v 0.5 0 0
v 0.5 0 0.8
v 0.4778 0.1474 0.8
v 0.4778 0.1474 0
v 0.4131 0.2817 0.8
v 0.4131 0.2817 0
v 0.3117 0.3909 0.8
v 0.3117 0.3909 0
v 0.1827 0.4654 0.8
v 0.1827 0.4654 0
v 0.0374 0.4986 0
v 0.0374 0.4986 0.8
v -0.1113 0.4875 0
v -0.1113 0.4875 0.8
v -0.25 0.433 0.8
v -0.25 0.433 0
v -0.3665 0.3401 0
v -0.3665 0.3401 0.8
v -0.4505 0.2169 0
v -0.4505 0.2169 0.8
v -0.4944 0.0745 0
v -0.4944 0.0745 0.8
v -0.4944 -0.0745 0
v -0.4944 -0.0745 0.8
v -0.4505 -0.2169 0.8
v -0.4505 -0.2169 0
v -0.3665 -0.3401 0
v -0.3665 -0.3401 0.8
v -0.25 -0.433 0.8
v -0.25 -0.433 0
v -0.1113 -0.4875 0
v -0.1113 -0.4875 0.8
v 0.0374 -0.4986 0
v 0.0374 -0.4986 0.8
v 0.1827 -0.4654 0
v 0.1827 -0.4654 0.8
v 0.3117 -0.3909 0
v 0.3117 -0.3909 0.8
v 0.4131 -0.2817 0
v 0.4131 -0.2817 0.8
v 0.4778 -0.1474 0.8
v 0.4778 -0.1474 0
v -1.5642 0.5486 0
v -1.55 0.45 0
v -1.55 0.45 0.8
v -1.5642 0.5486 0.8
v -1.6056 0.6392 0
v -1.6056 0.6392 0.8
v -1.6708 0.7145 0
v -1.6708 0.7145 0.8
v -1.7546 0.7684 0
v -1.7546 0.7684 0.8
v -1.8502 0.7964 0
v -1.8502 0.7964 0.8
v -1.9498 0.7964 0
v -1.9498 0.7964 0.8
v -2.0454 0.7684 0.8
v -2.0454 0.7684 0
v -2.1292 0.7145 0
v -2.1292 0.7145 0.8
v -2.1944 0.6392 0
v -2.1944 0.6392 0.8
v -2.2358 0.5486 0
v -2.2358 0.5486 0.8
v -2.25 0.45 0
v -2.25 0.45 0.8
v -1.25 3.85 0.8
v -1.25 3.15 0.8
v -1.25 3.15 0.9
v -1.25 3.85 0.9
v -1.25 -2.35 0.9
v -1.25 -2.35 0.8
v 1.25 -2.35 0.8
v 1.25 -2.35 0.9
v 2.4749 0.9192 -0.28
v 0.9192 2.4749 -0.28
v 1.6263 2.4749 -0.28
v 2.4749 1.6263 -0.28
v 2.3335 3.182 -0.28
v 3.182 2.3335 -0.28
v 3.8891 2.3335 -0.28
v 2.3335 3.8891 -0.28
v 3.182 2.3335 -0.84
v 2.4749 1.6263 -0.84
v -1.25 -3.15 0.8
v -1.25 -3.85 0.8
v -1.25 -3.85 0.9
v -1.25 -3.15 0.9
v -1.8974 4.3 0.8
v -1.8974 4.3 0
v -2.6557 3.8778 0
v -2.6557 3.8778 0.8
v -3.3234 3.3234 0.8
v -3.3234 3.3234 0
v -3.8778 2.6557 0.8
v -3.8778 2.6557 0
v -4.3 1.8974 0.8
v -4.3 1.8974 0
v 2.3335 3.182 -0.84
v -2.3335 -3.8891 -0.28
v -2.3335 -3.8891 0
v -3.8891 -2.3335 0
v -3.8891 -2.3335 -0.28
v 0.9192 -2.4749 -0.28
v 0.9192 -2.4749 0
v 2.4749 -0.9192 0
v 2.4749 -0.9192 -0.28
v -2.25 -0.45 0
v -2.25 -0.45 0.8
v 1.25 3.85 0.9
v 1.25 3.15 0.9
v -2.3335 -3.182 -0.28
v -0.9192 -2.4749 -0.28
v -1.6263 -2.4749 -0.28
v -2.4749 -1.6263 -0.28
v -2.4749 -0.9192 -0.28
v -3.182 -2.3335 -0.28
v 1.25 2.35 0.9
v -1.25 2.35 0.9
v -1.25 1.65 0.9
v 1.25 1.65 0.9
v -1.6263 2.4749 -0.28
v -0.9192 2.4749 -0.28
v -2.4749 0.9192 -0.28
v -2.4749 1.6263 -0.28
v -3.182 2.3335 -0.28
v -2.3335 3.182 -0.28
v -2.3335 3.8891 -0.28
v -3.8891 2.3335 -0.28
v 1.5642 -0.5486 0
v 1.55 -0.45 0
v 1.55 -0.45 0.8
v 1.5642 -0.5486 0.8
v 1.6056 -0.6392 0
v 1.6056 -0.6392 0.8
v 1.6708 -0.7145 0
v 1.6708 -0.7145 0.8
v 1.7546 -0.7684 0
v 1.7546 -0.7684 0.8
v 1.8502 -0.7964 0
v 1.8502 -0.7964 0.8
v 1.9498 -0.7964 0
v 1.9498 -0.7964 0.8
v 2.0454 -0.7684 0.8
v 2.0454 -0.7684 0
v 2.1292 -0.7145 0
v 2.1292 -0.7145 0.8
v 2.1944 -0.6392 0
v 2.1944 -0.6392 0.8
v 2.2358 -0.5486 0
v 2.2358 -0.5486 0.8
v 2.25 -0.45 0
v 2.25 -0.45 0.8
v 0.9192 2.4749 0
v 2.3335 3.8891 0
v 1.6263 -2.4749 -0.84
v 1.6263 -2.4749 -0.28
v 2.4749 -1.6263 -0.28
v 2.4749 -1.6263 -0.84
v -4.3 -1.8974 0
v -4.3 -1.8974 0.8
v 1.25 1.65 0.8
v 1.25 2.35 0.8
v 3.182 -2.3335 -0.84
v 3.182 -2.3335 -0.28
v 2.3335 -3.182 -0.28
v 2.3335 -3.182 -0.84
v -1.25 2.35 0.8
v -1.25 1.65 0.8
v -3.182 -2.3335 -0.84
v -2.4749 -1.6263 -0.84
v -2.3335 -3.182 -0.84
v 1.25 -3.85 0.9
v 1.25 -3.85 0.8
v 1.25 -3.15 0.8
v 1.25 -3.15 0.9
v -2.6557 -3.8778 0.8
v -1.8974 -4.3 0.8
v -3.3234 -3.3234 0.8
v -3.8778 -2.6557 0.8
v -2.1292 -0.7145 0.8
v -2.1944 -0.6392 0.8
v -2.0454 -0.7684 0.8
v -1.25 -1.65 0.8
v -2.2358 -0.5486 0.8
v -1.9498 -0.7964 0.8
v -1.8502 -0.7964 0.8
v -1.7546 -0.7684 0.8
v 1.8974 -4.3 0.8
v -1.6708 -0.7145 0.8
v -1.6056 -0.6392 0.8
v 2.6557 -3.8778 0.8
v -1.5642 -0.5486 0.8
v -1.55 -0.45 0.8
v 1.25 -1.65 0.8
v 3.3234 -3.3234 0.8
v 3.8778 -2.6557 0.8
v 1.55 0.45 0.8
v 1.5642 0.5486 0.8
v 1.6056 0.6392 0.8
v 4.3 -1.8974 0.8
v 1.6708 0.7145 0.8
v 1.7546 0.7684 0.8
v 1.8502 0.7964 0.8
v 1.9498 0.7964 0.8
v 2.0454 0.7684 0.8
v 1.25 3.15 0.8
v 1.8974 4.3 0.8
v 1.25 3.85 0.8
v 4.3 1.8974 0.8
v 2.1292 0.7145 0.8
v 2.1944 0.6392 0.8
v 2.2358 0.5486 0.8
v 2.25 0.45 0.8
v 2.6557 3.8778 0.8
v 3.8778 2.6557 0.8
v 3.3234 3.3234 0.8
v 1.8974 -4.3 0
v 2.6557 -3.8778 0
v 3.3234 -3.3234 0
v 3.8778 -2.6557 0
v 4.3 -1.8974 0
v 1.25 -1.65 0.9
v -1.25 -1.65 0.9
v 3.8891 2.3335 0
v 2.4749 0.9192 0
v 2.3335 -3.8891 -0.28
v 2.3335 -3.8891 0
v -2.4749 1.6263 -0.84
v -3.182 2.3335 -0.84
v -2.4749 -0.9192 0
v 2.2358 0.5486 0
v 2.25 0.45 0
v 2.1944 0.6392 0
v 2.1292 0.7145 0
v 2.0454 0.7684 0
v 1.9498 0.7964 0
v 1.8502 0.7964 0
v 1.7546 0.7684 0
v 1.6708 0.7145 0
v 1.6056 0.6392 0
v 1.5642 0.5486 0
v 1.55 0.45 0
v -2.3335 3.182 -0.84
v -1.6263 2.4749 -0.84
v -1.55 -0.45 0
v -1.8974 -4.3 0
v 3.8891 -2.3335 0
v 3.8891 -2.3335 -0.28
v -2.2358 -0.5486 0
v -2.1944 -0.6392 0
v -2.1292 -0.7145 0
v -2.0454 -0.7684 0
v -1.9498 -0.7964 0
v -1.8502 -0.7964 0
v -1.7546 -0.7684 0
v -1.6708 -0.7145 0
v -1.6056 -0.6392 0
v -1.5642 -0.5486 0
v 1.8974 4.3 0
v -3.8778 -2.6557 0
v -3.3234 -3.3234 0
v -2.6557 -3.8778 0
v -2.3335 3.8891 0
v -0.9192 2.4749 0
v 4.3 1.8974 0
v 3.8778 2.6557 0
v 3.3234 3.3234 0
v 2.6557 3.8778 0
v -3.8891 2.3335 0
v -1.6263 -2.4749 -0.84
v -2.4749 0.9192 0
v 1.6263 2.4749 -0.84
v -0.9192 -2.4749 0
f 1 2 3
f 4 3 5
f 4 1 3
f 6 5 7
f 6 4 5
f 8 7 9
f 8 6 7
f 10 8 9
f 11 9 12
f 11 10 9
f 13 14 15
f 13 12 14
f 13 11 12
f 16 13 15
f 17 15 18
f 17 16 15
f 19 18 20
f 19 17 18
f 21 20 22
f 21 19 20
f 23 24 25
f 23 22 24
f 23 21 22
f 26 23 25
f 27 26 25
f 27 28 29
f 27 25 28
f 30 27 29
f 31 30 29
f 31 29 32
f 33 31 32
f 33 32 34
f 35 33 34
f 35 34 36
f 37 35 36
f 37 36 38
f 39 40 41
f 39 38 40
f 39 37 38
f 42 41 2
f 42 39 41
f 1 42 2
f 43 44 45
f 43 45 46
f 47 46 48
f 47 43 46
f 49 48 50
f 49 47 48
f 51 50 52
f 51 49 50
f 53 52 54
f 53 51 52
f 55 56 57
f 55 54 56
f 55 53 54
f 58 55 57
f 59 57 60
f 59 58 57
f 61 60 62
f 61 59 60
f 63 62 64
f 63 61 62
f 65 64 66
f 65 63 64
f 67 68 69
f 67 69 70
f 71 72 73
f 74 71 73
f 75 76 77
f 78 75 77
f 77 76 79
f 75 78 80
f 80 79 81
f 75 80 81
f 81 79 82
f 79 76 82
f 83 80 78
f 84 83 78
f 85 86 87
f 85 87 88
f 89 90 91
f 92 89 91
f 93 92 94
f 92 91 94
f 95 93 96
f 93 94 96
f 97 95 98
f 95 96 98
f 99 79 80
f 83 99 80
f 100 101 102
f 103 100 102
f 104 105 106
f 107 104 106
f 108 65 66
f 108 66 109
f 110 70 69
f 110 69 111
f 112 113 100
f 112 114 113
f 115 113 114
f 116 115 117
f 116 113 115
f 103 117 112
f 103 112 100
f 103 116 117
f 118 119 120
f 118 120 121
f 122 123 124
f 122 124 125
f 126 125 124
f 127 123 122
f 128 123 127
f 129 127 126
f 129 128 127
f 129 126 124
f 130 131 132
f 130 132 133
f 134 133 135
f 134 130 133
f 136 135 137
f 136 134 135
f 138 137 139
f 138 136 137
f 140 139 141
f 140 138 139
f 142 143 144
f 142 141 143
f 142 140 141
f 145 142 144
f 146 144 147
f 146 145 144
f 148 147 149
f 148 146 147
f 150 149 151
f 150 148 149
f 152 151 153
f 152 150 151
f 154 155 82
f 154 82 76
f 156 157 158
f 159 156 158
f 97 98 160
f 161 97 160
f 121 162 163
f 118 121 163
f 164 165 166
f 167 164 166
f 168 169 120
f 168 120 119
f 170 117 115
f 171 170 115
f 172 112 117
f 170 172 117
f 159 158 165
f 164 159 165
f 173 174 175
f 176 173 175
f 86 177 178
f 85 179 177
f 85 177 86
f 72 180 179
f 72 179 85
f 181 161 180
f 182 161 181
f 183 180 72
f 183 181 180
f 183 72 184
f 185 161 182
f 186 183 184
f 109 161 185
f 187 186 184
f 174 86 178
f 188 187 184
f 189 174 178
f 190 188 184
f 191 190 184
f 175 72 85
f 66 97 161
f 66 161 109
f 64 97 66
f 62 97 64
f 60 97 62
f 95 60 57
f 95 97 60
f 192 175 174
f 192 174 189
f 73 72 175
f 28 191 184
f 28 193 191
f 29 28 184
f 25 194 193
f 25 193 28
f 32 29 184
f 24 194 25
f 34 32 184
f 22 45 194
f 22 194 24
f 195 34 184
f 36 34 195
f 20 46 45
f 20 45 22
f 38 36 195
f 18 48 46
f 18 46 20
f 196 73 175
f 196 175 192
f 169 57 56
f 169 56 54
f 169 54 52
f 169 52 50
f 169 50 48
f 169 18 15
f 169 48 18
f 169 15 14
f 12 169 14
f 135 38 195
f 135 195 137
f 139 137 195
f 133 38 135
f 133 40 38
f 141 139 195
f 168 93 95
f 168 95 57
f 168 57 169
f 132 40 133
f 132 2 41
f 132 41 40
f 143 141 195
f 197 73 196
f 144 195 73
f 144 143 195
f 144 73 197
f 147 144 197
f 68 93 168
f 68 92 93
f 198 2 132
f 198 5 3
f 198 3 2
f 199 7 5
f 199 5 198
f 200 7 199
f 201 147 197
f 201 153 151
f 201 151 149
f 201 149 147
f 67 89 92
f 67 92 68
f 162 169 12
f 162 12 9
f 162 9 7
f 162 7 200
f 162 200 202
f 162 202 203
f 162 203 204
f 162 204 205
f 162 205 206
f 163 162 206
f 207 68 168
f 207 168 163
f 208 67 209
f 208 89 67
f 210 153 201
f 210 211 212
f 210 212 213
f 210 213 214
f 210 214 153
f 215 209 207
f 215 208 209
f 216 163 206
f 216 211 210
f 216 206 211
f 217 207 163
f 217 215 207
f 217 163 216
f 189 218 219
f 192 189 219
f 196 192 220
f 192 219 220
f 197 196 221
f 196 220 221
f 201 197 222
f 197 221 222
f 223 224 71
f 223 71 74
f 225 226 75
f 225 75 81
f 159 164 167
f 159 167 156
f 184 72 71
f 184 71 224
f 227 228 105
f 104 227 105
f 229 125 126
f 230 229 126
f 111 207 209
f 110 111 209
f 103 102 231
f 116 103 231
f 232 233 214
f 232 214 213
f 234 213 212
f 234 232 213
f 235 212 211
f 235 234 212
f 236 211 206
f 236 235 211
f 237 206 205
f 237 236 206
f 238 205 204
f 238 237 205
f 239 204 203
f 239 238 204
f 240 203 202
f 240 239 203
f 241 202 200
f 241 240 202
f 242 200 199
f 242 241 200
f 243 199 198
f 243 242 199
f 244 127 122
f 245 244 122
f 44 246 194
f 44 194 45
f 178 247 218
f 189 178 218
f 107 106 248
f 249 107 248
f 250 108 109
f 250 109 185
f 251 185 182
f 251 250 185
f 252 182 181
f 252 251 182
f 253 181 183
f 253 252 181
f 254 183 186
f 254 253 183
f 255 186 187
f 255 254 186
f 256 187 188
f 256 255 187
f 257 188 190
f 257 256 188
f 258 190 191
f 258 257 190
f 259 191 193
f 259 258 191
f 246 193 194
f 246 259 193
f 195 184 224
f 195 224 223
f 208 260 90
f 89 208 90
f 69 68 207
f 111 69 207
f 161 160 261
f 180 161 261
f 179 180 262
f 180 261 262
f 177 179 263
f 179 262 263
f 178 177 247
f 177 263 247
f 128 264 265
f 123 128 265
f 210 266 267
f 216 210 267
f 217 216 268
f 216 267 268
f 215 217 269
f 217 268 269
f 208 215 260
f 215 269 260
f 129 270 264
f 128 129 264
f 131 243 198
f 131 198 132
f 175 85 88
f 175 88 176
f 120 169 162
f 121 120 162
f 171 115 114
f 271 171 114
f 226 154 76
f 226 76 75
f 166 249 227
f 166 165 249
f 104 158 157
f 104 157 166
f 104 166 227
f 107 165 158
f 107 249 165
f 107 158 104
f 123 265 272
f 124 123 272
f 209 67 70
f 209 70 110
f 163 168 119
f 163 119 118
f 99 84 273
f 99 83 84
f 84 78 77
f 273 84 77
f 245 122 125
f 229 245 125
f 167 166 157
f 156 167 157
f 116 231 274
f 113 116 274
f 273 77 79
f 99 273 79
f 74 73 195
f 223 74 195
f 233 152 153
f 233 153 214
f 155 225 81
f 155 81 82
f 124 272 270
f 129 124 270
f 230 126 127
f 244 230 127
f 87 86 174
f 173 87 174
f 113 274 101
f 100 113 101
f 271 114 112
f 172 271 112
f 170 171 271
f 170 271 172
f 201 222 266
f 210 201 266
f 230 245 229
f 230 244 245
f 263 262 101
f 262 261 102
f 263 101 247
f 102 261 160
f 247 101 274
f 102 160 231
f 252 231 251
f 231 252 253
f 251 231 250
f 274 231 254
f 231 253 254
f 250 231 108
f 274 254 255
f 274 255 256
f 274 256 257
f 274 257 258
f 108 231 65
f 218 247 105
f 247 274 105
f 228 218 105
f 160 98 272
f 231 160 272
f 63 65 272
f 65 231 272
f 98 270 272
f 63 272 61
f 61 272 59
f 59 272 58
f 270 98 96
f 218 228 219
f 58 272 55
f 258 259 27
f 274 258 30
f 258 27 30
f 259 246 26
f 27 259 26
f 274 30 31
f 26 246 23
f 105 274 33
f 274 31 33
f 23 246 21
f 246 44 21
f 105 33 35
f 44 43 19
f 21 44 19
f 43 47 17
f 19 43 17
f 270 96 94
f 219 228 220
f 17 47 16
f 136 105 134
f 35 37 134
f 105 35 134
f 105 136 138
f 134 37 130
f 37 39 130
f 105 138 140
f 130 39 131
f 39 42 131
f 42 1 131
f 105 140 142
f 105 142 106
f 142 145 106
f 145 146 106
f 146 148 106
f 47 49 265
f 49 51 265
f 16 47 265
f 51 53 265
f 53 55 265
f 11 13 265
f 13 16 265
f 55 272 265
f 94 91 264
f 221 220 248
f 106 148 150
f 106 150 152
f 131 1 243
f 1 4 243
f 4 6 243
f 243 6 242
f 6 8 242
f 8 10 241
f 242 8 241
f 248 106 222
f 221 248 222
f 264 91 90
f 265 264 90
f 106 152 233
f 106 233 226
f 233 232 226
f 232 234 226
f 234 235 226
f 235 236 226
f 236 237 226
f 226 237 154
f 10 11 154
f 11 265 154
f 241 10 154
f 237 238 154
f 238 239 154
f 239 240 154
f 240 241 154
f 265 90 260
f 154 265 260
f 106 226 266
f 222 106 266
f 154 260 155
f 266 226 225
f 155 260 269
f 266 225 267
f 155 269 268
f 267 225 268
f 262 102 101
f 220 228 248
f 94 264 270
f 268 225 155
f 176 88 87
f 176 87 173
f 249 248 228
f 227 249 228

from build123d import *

# Parameters (mm, degrees)
EXTRUDE_5_DEPTH     = 0.8
EXTRUDE_6_DEPTH     = 0.28
EXTRUDE_8_DEPTH     = 0.84
SKETCH_1_9_R        = 0.5
CUT_EXTRUDE_1_DEPTH = 1.8
SKETCH_2_W          = 2.5
SKETCH_2_H          = 0.7
EXTRUDE_9_DEPTH     = 0.1


with BuildPart() as part:
    # Sketch 1 → Extrude 5 (new body)
    with BuildSketch(Plane.XY):
        with BuildLine():
            Line((-1.897366596, -4.3), (1.897366596, -4.3))
            ThreePointArc((1.897366596, -4.3), (3.323401872, -3.323401872), (4.3, -1.897366596))
            Line((4.3, -1.897366596), (4.3, 1.897366596))
            ThreePointArc((4.3, 1.897366596), (3.323401872, 3.323401872), (1.897366596, 4.3))
            Line((1.897366596, 4.3), (-1.897366596, 4.3))
            ThreePointArc((-1.897366596, 4.3), (-3.323401872, 3.323401872), (-4.3, 1.897366596))
            Line((-4.3, 1.897366596), (-4.3, -1.897366596))
            ThreePointArc((-4.3, -1.897366596), (-3.323401872, -3.323401872), (-1.897366596, -4.3))
        make_face()
    extrude(amount=EXTRUDE_5_DEPTH)

    # Sketch 1_6 → Extrude 6 (add)
    with BuildSketch(Plane.XY):
        Polygon((-0.919238816, 2.474873734), (-2.474873734, 0.919238816), (-3.889087297, 2.333452378), (-2.333452378, 3.889087297), align=None)
        Polygon((-1.626345597, 2.474873734), (-2.333452378, 3.181980515), (-3.181980515, 2.333452378), (-2.474873734, 1.626345597), align=None, mode=Mode.SUBTRACT)
        Polygon((2.474873734, 0.919238816), (3.889087297, 2.333452378), (2.333452378, 3.889087297), (0.919238816, 2.474873734), align=None)
        Polygon((2.474873734, 1.626345597), (3.181980515, 2.333452378), (2.333452378, 3.181980515), (1.626345597, 2.474873734), align=None, mode=Mode.SUBTRACT)
        Polygon((0.919238816, -2.474873734), (2.474873734, -0.919238816), (3.889087297, -2.333452378), (2.333452378, -3.889087297), align=None)
        Polygon((1.626345597, -2.474873734), (2.333452378, -3.181980515), (3.181980515, -2.333452378), (2.474873734, -1.626345597), align=None, mode=Mode.SUBTRACT)
        Polygon((-2.474873734, -0.919238816), (-0.919238816, -2.474873734), (-2.333452378, -3.889087297), (-3.889087297, -2.333452378), align=None)
        Polygon((-2.474873734, -1.626345597), (-3.181980515, -2.333452378), (-2.333452378, -3.181980515), (-1.626345597, -2.474873734), align=None, mode=Mode.SUBTRACT)
    extrude(amount=-EXTRUDE_6_DEPTH)

    # Sketch 1_8 → Extrude 8 (add)
    with BuildSketch(Plane.XY):
        Polygon((-1.626345597, 2.474873734), (-2.474873734, 1.626345597), (-3.181980515, 2.333452378), (-2.333452378, 3.181980515), align=None)
        Polygon((2.474873734, 1.626345597), (1.626345597, 2.474873734), (2.333452378, 3.181980515), (3.181980515, 2.333452378), align=None)
        Polygon((1.626345597, -2.474873734), (2.474873734, -1.626345597), (3.181980515, -2.333452378), (2.333452378, -3.181980515), align=None)
        Polygon((-2.474873734, -1.626345597), (-1.626345597, -2.474873734), (-2.333452378, -3.181980515), (-3.181980515, -2.333452378), align=None)
    extrude(amount=-EXTRUDE_8_DEPTH)

    # Sketch 1_9 → Cut-Extrude 1 (cut, through all)
    with BuildSketch(Plane.XY):
        with BuildLine():
            ThreePointArc((-2.25, -0.45), (-1.9, -0.8), (-1.55, -0.45))
            Line((-1.55, -0.45), (-1.55, 0.45))
            ThreePointArc((-1.55, 0.45), (-1.9, 0.8), (-2.25, 0.45))
            Line((-2.25, 0.45), (-2.25, -0.45))
        make_face()
        with BuildLine():
            Line((1.55, 0.45), (1.55, -0.45))
            ThreePointArc((1.55, -0.45), (1.9, -0.8), (2.25, -0.45))
            Line((2.25, -0.45), (2.25, 0.45))
            ThreePointArc((2.25, 0.45), (1.9, 0.8), (1.55, 0.45))
        make_face()
        Circle(SKETCH_1_9_R)
    extrude(amount=CUT_EXTRUDE_1_DEPTH, mode=Mode.SUBTRACT)

    # Sketch 2 → Extrude 9 (add)
    with BuildSketch(Plane.XY.offset(0.8)):
        with Locations((0, 3.5)):
            Rectangle(SKETCH_2_W, SKETCH_2_H)
        with Locations((0, 2)):
            Rectangle(SKETCH_2_W, SKETCH_2_H)
        with Locations((0, -2)):
            Rectangle(SKETCH_2_W, SKETCH_2_H)
        with Locations((0, -3.5)):
            Rectangle(SKETCH_2_W, SKETCH_2_H)
    extrude(amount=EXTRUDE_9_DEPTH)


solid = part.part
